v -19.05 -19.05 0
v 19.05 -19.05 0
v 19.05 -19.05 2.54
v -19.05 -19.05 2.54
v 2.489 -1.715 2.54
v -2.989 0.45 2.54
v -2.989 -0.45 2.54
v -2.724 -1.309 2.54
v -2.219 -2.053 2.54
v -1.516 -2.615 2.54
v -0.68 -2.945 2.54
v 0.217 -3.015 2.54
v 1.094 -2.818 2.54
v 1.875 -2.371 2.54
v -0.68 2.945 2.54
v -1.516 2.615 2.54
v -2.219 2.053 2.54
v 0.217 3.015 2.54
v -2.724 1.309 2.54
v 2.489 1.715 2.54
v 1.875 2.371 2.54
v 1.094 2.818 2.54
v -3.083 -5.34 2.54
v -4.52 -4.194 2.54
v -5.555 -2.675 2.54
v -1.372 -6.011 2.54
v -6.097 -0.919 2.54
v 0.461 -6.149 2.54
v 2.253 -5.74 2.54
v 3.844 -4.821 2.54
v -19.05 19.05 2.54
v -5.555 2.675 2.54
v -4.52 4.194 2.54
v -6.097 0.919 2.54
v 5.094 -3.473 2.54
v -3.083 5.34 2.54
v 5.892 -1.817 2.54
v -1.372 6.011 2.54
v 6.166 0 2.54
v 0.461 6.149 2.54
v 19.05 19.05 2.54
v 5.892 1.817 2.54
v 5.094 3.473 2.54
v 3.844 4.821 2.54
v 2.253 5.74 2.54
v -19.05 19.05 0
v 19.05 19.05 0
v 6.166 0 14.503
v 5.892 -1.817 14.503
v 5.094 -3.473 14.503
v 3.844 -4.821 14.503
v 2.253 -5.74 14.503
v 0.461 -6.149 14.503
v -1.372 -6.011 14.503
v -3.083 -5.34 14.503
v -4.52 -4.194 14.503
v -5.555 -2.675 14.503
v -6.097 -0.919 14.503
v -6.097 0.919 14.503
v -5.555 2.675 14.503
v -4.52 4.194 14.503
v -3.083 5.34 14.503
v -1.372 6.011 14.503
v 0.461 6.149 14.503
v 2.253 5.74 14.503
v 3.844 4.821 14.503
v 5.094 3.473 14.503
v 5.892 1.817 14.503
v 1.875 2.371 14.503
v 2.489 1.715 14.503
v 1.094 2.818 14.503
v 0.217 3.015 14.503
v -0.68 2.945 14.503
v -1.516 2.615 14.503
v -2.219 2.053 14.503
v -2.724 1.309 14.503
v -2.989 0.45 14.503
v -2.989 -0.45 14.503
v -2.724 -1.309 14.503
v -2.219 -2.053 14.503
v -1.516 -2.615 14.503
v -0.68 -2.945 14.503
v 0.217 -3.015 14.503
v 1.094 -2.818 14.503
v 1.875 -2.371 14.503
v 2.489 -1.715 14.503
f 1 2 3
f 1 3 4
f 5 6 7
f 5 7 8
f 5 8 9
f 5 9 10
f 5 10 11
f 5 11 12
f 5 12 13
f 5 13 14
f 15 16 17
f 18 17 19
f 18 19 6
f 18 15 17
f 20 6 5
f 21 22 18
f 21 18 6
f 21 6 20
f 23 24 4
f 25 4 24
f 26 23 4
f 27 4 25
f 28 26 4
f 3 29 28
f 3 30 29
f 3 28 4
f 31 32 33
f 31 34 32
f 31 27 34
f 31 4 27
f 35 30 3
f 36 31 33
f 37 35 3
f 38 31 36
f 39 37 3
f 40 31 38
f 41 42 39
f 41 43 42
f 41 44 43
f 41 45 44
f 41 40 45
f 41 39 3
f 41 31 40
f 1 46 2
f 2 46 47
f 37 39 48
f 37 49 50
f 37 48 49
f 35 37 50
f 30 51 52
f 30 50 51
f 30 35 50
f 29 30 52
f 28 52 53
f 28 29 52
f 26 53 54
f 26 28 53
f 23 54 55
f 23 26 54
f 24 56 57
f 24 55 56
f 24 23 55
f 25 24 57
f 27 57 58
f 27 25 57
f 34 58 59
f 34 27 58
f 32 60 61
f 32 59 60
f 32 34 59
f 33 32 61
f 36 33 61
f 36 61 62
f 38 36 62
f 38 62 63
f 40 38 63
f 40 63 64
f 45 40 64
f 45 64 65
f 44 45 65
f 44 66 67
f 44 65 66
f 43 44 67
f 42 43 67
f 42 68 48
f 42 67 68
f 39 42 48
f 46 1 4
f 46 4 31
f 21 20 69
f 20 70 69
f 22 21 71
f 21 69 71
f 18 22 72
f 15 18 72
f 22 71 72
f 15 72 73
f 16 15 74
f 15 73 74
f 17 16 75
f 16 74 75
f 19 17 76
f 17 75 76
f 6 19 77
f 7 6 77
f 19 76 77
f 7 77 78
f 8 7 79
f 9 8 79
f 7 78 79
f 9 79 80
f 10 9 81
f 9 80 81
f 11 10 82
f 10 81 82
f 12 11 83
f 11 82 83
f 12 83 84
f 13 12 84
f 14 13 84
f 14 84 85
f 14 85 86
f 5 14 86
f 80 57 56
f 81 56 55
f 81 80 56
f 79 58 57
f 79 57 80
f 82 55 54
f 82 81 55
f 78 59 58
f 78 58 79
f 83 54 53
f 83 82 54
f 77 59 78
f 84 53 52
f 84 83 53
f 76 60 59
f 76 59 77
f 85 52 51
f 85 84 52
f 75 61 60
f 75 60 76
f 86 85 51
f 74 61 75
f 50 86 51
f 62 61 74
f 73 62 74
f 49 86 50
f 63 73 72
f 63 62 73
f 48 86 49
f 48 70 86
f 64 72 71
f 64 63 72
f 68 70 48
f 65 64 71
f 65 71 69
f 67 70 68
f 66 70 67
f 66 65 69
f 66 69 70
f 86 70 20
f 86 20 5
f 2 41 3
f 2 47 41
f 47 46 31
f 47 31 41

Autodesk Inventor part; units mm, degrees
ref_plane "YZ Plane" through (0, 0, 0) normal (1, 0, 0) x (0, 1, 0)
ref_plane "XZ Plane" through (0, 0, 0) normal (0, 1, 0) x (-1, 0, 0)
ref_plane "XY Plane" through (0, 0, 0) normal (0, 0, 1) x (1, 0, 0)
sketch "Sketch1" plane through (0, 0, 0) normal (0, 0, 1) x (1, 0, 0)
  line L0 (19.05, -19.05) -> (-19.05, -19.05)
  line L1 (-19.05, -19.05) -> (-19.05, 19.05)
  line L2 (-19.05, 19.05) -> (19.05, 19.05)
  line L3 (19.05, 19.05) -> (19.05, -19.05)
  line L4 (19.05, -19.05) -> (-19.05, 19.05) construction
  line L5 (-19.05, -19.05) -> (19.05, 19.05) construction
  point P0 (0, 0)
  dimension "d0" = 38.1
  dimension "d1" = 38.1
extrude "Extrusion1" add sketch "Sketch1" along normal blind 2.54
sketch "Sketch2" plane through (0, 0, 2.54) normal (0, 0, 1) x (1, 0, 0)
  circle A0 centre (0, 0) radius 6.1658
  dimension "d4" = 12.3317
extrude "Extrusion2" add sketch "Sketch2" along normal blind 11.9634
sketch "Sketch3" plane through (0, 0, 14.5034) normal (0, 0, 1) x (1, 0, 0)
  circle A0 centre (0, 0) radius 3.0226
  line L0 (2.4892, 1.7146) -> (2.4892, -1.7146)
  dimension "d7" = 6.0452
  dimension "d8" = 5.5118
extrude "Extrusion3" cut sketch "Sketch3" against normal blind 11.9634 contours L0 A0 picked at (0.6593, -0.1215)
properties part number "Hub Prototype"
